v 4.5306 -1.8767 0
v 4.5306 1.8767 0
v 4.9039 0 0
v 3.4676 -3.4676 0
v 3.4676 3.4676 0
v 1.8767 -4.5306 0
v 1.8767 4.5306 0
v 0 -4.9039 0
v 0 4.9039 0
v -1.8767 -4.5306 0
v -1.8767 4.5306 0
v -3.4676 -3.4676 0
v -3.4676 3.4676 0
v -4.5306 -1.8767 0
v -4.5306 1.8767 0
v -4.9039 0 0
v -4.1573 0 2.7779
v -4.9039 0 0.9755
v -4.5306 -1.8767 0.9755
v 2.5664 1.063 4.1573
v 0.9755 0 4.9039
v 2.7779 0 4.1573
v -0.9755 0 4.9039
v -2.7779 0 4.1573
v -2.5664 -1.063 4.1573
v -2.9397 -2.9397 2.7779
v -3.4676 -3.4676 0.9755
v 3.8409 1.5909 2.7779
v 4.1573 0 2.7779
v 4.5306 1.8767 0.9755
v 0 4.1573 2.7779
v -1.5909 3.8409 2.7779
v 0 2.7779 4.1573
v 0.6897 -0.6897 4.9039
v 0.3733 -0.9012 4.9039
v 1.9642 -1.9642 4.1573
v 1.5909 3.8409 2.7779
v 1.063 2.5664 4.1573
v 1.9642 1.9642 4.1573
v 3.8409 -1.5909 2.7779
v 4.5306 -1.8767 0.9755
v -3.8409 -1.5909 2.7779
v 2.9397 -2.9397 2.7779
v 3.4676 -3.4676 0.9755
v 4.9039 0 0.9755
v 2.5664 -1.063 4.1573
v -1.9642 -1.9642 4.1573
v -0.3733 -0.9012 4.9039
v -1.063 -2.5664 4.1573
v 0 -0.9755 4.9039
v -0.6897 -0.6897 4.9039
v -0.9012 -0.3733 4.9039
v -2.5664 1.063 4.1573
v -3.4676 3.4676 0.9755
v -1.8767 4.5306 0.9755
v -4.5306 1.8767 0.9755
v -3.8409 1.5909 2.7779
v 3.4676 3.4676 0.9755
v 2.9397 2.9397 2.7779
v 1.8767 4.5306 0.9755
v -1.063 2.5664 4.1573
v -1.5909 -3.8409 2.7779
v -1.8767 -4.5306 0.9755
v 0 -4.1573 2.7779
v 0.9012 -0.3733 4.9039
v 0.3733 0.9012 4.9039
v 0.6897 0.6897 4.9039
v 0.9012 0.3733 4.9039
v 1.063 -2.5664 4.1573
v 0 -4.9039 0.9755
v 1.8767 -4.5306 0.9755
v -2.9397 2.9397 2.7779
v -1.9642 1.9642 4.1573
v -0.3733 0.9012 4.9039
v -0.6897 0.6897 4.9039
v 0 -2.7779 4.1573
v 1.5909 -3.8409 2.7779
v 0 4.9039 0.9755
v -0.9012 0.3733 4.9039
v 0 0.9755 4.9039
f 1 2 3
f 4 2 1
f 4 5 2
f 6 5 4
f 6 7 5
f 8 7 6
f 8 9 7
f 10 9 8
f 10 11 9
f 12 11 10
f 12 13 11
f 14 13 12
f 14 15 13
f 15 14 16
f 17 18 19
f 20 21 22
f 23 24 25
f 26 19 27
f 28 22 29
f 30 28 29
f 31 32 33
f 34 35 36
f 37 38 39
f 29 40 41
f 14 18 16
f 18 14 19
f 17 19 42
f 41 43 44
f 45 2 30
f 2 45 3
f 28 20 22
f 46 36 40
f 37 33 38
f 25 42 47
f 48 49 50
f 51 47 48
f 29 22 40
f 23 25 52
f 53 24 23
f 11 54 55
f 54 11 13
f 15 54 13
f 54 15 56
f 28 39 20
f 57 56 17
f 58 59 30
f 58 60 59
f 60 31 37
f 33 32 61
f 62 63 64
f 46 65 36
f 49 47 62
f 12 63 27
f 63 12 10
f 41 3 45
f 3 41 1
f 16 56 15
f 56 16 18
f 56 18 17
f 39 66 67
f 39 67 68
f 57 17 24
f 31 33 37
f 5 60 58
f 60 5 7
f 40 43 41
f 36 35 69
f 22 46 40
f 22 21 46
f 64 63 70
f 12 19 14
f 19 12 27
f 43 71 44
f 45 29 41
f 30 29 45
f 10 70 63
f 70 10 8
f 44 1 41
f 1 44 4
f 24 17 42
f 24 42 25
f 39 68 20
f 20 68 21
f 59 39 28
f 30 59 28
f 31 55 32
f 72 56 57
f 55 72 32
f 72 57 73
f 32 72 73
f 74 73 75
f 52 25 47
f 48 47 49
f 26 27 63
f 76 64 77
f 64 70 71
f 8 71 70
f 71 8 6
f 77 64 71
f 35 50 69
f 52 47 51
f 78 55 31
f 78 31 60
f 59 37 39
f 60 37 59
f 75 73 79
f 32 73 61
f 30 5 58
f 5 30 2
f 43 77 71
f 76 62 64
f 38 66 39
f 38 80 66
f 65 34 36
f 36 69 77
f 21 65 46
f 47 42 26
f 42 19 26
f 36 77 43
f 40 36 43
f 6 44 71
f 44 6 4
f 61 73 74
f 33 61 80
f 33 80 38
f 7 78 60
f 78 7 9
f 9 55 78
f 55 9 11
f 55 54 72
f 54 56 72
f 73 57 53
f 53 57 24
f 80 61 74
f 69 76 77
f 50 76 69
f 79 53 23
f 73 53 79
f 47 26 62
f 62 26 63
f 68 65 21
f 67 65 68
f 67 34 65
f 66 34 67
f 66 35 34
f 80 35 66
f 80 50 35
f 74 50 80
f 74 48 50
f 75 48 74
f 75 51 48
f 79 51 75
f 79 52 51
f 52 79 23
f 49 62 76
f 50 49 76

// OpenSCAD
module disc(diameter, depth, center = false) {
  translate([ 0, 0, center ? -depth / 2 : 0 ]) {
    linear_extrude(depth) { circle(d = diameter); }
  }
}

module half_sphere(diameter) {
  intersection() {
    translate([ 0, 0, diameter / 4 ]) {
      cube([ diameter, diameter, diameter / 2 ], center = true);
    }

    sphere(d = diameter);
  }
}

half_sphere(10);
